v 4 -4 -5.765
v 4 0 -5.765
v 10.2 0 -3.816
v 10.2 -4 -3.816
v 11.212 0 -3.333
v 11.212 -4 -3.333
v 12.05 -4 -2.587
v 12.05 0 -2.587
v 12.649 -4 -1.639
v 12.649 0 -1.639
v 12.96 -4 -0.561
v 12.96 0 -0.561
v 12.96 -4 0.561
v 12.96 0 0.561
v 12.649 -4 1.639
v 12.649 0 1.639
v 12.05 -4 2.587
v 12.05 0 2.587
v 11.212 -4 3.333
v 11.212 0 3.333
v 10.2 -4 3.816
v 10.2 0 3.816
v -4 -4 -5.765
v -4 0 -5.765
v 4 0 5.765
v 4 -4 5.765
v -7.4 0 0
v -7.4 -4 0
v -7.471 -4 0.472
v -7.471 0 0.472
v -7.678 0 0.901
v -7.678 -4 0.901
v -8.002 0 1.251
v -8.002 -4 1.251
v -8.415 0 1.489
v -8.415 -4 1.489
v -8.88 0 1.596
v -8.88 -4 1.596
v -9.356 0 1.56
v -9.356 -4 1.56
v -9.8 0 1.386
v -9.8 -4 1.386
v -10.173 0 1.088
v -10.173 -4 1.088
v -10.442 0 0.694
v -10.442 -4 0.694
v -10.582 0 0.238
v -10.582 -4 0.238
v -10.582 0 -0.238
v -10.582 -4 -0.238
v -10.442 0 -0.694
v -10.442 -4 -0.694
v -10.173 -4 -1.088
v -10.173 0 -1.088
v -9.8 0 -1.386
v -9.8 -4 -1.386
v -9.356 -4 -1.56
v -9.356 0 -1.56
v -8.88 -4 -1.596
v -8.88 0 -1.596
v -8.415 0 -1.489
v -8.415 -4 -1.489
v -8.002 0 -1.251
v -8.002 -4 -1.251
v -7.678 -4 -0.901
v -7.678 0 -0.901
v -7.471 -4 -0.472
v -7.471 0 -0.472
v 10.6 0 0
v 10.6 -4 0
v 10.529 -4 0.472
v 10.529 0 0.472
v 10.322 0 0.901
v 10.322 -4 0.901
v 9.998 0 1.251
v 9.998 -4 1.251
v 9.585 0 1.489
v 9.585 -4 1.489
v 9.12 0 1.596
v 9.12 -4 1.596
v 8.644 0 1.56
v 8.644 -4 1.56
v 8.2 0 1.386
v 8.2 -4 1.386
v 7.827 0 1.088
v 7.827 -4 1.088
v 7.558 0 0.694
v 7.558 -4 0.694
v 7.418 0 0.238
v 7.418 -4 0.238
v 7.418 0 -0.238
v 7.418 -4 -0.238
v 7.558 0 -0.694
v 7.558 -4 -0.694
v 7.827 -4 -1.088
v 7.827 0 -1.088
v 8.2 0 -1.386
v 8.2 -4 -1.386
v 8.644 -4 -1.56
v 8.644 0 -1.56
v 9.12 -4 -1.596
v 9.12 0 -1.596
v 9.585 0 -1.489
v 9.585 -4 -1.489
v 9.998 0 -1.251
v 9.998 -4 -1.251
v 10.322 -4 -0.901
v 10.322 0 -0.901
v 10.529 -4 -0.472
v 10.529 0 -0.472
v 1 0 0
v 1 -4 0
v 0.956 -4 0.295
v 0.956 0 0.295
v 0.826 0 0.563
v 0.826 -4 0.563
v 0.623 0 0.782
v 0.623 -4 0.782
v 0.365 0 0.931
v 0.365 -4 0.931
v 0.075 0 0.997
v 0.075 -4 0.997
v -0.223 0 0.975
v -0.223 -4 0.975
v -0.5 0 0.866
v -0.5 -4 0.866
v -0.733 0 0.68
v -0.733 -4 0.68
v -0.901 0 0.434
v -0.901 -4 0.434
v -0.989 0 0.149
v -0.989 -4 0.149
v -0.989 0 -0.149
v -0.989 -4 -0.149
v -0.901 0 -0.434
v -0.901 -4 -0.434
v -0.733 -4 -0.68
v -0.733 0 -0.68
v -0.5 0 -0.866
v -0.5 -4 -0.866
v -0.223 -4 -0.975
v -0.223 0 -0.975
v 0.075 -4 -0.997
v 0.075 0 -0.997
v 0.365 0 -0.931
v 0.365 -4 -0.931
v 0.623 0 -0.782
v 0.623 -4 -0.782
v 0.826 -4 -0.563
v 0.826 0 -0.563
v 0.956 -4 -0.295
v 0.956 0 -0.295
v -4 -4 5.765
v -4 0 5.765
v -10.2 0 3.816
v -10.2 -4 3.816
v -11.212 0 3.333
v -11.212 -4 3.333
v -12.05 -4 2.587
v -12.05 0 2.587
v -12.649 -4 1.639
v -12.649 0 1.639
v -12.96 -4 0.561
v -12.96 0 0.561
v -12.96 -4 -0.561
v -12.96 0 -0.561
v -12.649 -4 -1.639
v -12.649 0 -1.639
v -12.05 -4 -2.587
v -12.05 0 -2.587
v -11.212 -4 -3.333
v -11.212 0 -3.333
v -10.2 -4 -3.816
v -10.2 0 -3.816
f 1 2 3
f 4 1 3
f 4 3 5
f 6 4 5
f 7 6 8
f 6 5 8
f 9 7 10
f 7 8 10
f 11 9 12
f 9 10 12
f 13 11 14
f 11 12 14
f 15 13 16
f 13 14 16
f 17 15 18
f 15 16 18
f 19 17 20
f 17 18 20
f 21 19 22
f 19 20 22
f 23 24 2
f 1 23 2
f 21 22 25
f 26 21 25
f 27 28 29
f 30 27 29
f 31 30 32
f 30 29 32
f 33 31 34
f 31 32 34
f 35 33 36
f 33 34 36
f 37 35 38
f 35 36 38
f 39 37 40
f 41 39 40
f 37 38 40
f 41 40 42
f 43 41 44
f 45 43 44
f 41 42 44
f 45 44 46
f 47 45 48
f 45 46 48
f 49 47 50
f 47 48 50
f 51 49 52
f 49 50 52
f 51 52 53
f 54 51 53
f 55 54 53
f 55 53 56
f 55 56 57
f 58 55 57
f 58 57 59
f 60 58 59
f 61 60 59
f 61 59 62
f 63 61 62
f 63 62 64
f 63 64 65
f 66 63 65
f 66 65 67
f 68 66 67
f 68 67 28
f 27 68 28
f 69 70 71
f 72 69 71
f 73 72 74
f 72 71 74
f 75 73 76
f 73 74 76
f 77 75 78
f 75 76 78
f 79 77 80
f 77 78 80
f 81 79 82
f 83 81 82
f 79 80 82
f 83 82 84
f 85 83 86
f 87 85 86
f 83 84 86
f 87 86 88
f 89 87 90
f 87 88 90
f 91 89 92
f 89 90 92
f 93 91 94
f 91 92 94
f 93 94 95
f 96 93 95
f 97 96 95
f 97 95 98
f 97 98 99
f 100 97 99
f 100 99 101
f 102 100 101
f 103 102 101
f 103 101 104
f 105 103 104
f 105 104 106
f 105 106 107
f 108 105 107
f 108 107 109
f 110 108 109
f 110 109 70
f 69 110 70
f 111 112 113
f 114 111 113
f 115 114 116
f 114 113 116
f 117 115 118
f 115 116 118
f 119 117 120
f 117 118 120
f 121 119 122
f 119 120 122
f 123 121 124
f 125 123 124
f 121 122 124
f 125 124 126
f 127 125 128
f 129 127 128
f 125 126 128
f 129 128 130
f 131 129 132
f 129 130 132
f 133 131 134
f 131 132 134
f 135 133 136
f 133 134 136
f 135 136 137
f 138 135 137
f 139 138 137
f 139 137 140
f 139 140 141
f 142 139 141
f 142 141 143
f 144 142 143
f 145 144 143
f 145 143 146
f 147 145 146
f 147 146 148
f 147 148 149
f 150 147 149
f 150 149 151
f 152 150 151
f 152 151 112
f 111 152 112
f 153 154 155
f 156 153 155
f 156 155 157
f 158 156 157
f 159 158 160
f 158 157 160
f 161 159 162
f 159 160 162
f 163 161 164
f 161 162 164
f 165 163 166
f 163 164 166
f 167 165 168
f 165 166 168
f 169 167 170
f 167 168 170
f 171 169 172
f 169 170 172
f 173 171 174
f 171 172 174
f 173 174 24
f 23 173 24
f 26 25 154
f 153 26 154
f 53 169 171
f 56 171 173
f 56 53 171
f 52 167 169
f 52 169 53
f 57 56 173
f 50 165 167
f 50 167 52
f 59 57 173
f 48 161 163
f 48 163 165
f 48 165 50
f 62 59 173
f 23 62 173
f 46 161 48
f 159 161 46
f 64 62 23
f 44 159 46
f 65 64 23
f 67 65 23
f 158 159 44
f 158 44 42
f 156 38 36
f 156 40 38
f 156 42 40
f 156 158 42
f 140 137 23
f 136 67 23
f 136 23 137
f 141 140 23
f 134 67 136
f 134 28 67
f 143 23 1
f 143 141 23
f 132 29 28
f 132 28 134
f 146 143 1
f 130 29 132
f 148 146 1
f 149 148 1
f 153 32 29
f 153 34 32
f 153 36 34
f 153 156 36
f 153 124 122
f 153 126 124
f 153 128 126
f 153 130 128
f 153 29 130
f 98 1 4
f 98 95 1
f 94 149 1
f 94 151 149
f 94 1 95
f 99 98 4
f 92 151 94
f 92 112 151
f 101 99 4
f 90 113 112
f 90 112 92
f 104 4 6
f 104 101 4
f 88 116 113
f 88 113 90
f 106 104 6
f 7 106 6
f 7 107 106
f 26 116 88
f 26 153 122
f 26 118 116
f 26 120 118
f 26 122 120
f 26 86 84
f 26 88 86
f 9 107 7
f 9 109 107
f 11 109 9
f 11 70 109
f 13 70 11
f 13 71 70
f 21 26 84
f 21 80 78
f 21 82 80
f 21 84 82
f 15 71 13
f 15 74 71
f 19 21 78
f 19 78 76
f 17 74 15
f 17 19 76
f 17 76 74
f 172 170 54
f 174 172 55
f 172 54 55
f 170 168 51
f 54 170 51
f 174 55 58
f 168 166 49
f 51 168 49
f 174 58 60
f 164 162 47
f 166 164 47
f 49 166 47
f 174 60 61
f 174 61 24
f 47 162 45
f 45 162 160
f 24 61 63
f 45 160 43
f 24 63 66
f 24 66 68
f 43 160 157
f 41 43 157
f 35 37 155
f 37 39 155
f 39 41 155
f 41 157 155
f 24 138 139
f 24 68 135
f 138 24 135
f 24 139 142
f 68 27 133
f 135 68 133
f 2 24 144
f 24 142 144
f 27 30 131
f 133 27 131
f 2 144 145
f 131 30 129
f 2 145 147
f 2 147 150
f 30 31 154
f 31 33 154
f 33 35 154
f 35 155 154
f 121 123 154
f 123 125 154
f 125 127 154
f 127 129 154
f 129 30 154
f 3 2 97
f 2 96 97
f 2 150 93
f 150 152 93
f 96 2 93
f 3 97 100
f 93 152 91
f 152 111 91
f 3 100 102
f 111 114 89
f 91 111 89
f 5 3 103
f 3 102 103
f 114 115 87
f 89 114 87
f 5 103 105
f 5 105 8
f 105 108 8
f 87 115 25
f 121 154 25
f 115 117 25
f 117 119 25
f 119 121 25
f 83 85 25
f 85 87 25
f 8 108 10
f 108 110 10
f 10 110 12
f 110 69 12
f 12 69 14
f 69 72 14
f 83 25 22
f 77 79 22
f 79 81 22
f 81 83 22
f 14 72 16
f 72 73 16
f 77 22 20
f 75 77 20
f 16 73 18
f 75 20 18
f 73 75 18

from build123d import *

# Parameters (mm, degrees)
F1_DEPTH = 4
F2_R     = 1.6
F3_DEPTH = 4.001
F4_R     = 1
F5_DEPTH = 4.001


with BuildPart() as f1:
    # F0 (on Front) → F1 (new body)
    with BuildSketch(Plane.XZ):
        with BuildLine():
            Line((-4, 5.765), (-10.199683, 3.815857))
            ThreePointArc((-10.199683, 3.815857), (-13, 0), (-10.199683, -3.815857))
            Line((-10.199683, -3.815857), (-4, -5.765))
            Line((-4, -5.765), (4, -5.765))
            Line((4, -5.765), (10.199683, -3.815857))
            ThreePointArc((10.199683, -3.815857), (13, 0), (10.199683, 3.815857))
            Line((10.199683, 3.815857), (4, 5.765))
            Line((4, 5.765), (-4, 5.765))
        make_face()
    extrude(amount=F1_DEPTH)

    # F2 (on face) → F3 (cut, through all)
    with BuildSketch(Plane.XZ.offset(4)):
        with Locations((-9, 0)):
            Circle(F2_R)
        with Locations((9, 0)):
            Circle(F2_R)
    extrude(amount=-F3_DEPTH, mode=Mode.SUBTRACT)

    # F4 (on face) → F5 (cut, through all)
    with BuildSketch(Plane.XZ.offset(4)):
        Circle(F4_R)
    extrude(amount=-F5_DEPTH, mode=Mode.SUBTRACT)


solid = f1.part
